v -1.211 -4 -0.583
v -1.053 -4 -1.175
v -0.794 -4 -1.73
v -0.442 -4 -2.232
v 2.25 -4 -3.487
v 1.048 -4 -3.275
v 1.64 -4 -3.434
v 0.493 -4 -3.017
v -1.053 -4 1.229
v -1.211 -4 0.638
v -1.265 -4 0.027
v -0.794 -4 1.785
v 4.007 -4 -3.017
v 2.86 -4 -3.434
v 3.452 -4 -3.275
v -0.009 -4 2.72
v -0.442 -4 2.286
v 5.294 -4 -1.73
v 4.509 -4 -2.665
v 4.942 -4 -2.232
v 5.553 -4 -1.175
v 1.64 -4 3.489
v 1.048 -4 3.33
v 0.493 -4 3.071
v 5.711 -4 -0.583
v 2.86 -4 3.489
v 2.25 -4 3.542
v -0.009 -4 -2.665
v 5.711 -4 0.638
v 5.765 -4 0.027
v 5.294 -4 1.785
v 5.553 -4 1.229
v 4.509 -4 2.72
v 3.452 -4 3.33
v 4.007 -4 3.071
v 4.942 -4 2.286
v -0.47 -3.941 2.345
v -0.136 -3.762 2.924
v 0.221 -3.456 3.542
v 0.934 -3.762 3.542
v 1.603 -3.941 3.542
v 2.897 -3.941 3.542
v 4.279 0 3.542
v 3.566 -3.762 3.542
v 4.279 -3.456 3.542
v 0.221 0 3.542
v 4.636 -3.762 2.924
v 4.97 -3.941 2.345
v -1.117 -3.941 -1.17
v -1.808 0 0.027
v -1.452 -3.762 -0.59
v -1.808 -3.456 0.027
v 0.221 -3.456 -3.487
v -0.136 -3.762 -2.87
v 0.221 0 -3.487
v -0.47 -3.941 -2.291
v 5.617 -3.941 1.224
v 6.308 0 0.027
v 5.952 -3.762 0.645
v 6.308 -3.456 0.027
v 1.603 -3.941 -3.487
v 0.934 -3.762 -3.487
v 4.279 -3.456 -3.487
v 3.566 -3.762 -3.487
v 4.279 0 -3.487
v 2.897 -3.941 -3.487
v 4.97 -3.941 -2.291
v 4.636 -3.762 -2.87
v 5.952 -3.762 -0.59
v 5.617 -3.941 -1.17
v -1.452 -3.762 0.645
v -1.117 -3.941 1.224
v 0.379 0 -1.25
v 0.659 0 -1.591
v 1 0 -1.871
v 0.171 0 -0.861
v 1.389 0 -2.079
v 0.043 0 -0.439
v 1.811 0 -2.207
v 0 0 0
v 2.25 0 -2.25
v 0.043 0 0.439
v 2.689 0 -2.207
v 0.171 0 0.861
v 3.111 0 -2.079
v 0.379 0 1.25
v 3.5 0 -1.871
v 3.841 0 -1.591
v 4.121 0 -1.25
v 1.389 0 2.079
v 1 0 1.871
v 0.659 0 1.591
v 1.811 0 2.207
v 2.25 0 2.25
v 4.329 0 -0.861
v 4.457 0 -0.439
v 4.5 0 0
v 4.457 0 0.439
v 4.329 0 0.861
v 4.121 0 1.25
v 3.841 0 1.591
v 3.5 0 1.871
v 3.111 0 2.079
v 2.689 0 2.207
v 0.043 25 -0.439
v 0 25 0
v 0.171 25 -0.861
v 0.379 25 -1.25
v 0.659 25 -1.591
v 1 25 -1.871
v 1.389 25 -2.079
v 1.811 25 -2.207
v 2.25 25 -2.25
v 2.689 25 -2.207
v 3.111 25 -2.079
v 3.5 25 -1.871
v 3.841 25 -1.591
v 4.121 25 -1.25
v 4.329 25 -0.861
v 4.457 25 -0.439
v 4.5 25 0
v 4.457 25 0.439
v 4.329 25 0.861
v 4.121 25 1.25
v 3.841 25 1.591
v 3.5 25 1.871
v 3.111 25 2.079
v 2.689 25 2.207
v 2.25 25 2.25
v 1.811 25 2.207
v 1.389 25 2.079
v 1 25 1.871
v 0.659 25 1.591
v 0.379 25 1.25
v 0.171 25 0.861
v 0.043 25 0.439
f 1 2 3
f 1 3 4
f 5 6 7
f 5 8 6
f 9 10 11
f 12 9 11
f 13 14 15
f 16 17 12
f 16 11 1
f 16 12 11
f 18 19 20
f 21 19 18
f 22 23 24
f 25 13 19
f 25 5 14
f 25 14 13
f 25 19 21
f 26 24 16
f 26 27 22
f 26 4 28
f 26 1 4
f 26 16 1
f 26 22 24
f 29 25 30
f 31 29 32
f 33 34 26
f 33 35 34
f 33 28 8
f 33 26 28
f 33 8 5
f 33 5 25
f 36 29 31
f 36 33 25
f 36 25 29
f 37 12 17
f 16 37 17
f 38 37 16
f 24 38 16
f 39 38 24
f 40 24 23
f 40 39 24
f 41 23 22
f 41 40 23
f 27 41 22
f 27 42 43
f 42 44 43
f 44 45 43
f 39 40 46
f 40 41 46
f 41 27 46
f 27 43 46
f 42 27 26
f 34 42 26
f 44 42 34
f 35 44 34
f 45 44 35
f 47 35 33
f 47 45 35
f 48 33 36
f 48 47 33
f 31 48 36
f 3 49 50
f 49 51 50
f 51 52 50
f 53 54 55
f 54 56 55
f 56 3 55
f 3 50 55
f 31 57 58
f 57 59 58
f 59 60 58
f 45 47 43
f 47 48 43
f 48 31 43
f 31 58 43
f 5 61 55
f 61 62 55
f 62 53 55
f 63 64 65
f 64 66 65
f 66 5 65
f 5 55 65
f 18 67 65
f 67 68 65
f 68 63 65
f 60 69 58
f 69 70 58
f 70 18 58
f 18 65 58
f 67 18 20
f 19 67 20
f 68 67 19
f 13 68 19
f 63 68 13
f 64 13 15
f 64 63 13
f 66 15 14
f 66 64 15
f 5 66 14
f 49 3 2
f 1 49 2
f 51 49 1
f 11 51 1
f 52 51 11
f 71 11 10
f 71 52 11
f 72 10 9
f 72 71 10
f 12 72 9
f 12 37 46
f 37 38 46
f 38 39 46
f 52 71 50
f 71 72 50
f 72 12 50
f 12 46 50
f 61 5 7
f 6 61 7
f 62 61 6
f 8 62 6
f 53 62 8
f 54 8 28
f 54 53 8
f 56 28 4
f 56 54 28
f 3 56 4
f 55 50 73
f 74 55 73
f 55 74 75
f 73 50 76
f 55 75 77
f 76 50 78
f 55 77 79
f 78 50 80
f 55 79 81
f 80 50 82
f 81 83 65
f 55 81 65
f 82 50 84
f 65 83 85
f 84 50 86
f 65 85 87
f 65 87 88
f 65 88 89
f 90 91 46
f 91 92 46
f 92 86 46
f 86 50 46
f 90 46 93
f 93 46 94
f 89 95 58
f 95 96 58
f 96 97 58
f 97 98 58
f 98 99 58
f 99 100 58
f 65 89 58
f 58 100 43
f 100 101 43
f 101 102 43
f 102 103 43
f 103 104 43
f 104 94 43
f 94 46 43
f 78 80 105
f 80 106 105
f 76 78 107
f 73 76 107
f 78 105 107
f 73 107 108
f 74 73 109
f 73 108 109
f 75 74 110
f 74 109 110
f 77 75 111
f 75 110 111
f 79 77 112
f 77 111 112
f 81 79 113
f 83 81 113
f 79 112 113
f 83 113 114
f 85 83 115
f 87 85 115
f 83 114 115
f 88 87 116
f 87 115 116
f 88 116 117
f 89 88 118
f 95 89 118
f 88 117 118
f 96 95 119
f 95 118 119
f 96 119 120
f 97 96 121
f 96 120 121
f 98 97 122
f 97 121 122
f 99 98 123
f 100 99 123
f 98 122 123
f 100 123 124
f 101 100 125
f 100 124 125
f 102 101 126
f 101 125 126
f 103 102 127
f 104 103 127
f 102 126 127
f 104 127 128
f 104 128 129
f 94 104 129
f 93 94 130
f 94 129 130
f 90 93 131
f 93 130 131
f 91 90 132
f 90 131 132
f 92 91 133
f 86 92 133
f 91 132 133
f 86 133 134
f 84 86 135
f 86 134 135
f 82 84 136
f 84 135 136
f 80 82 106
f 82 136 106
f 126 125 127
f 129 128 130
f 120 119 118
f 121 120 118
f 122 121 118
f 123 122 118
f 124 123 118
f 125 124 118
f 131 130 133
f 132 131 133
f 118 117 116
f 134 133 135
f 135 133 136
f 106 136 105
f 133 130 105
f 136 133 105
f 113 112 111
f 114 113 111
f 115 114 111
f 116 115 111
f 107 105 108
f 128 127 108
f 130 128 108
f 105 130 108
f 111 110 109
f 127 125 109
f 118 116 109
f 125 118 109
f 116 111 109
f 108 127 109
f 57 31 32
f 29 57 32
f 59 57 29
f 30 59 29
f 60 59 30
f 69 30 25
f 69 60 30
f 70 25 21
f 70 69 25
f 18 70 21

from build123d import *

# Parameters (mm, degrees)
SKETCH2_W           = 2.25
SKETCH2_H           = 25
BOSS_EXTRUDE1_DEPTH = 4
SKETCH4_OUTSIDE_W   = 76.3
SKETCH4_OUTSIDE_H   = 75.213
SKETCH4_OUTSIDE_R   = 3.514702834
CUT_EXTRUDE1_DEPTH  = 30
CUT_EXTRUDE1_TAPER  = 45


with BuildPart() as part:
    # Sketch2 → Revolve1 (revolve)
    with BuildSketch(Plane.XY):
        with Locations((1.125, 12.5)):
            Rectangle(SKETCH2_W, SKETCH2_H)
    revolve(axis=Axis((2.25, 25, 0), (0, -1, 0)))

    # Sketch3 → Boss-Extrude1 (add)
    with BuildSketch(Plane.XZ):
        Polygon((6.308429255, 0.02726243), (4.279214628, 3.541965265), (0.220785372, 3.541965265), (-1.808429255, 0.02726243), (0.220785372, -3.487440404), (4.279214628, -3.487440404), align=None)
    extrude(amount=BOSS_EXTRUDE1_DEPTH)

    # Sketch4 outside → Cut-Extrude1 (cut, through all)
    with BuildSketch(Plane(origin=(0, -4, 0), x_dir=(-1, 0, 0), z_dir=(0, -1, 0))):
        with Locations((-2.25, -0.0275)):
            Rectangle(SKETCH4_OUTSIDE_W, SKETCH4_OUTSIDE_H)
        with Locations((-2.25, -0.02726243)):
            Circle(SKETCH4_OUTSIDE_R, mode=Mode.SUBTRACT)
    extrude(amount=-CUT_EXTRUDE1_DEPTH, taper=CUT_EXTRUDE1_TAPER, mode=Mode.SUBTRACT)


solid = part.part
